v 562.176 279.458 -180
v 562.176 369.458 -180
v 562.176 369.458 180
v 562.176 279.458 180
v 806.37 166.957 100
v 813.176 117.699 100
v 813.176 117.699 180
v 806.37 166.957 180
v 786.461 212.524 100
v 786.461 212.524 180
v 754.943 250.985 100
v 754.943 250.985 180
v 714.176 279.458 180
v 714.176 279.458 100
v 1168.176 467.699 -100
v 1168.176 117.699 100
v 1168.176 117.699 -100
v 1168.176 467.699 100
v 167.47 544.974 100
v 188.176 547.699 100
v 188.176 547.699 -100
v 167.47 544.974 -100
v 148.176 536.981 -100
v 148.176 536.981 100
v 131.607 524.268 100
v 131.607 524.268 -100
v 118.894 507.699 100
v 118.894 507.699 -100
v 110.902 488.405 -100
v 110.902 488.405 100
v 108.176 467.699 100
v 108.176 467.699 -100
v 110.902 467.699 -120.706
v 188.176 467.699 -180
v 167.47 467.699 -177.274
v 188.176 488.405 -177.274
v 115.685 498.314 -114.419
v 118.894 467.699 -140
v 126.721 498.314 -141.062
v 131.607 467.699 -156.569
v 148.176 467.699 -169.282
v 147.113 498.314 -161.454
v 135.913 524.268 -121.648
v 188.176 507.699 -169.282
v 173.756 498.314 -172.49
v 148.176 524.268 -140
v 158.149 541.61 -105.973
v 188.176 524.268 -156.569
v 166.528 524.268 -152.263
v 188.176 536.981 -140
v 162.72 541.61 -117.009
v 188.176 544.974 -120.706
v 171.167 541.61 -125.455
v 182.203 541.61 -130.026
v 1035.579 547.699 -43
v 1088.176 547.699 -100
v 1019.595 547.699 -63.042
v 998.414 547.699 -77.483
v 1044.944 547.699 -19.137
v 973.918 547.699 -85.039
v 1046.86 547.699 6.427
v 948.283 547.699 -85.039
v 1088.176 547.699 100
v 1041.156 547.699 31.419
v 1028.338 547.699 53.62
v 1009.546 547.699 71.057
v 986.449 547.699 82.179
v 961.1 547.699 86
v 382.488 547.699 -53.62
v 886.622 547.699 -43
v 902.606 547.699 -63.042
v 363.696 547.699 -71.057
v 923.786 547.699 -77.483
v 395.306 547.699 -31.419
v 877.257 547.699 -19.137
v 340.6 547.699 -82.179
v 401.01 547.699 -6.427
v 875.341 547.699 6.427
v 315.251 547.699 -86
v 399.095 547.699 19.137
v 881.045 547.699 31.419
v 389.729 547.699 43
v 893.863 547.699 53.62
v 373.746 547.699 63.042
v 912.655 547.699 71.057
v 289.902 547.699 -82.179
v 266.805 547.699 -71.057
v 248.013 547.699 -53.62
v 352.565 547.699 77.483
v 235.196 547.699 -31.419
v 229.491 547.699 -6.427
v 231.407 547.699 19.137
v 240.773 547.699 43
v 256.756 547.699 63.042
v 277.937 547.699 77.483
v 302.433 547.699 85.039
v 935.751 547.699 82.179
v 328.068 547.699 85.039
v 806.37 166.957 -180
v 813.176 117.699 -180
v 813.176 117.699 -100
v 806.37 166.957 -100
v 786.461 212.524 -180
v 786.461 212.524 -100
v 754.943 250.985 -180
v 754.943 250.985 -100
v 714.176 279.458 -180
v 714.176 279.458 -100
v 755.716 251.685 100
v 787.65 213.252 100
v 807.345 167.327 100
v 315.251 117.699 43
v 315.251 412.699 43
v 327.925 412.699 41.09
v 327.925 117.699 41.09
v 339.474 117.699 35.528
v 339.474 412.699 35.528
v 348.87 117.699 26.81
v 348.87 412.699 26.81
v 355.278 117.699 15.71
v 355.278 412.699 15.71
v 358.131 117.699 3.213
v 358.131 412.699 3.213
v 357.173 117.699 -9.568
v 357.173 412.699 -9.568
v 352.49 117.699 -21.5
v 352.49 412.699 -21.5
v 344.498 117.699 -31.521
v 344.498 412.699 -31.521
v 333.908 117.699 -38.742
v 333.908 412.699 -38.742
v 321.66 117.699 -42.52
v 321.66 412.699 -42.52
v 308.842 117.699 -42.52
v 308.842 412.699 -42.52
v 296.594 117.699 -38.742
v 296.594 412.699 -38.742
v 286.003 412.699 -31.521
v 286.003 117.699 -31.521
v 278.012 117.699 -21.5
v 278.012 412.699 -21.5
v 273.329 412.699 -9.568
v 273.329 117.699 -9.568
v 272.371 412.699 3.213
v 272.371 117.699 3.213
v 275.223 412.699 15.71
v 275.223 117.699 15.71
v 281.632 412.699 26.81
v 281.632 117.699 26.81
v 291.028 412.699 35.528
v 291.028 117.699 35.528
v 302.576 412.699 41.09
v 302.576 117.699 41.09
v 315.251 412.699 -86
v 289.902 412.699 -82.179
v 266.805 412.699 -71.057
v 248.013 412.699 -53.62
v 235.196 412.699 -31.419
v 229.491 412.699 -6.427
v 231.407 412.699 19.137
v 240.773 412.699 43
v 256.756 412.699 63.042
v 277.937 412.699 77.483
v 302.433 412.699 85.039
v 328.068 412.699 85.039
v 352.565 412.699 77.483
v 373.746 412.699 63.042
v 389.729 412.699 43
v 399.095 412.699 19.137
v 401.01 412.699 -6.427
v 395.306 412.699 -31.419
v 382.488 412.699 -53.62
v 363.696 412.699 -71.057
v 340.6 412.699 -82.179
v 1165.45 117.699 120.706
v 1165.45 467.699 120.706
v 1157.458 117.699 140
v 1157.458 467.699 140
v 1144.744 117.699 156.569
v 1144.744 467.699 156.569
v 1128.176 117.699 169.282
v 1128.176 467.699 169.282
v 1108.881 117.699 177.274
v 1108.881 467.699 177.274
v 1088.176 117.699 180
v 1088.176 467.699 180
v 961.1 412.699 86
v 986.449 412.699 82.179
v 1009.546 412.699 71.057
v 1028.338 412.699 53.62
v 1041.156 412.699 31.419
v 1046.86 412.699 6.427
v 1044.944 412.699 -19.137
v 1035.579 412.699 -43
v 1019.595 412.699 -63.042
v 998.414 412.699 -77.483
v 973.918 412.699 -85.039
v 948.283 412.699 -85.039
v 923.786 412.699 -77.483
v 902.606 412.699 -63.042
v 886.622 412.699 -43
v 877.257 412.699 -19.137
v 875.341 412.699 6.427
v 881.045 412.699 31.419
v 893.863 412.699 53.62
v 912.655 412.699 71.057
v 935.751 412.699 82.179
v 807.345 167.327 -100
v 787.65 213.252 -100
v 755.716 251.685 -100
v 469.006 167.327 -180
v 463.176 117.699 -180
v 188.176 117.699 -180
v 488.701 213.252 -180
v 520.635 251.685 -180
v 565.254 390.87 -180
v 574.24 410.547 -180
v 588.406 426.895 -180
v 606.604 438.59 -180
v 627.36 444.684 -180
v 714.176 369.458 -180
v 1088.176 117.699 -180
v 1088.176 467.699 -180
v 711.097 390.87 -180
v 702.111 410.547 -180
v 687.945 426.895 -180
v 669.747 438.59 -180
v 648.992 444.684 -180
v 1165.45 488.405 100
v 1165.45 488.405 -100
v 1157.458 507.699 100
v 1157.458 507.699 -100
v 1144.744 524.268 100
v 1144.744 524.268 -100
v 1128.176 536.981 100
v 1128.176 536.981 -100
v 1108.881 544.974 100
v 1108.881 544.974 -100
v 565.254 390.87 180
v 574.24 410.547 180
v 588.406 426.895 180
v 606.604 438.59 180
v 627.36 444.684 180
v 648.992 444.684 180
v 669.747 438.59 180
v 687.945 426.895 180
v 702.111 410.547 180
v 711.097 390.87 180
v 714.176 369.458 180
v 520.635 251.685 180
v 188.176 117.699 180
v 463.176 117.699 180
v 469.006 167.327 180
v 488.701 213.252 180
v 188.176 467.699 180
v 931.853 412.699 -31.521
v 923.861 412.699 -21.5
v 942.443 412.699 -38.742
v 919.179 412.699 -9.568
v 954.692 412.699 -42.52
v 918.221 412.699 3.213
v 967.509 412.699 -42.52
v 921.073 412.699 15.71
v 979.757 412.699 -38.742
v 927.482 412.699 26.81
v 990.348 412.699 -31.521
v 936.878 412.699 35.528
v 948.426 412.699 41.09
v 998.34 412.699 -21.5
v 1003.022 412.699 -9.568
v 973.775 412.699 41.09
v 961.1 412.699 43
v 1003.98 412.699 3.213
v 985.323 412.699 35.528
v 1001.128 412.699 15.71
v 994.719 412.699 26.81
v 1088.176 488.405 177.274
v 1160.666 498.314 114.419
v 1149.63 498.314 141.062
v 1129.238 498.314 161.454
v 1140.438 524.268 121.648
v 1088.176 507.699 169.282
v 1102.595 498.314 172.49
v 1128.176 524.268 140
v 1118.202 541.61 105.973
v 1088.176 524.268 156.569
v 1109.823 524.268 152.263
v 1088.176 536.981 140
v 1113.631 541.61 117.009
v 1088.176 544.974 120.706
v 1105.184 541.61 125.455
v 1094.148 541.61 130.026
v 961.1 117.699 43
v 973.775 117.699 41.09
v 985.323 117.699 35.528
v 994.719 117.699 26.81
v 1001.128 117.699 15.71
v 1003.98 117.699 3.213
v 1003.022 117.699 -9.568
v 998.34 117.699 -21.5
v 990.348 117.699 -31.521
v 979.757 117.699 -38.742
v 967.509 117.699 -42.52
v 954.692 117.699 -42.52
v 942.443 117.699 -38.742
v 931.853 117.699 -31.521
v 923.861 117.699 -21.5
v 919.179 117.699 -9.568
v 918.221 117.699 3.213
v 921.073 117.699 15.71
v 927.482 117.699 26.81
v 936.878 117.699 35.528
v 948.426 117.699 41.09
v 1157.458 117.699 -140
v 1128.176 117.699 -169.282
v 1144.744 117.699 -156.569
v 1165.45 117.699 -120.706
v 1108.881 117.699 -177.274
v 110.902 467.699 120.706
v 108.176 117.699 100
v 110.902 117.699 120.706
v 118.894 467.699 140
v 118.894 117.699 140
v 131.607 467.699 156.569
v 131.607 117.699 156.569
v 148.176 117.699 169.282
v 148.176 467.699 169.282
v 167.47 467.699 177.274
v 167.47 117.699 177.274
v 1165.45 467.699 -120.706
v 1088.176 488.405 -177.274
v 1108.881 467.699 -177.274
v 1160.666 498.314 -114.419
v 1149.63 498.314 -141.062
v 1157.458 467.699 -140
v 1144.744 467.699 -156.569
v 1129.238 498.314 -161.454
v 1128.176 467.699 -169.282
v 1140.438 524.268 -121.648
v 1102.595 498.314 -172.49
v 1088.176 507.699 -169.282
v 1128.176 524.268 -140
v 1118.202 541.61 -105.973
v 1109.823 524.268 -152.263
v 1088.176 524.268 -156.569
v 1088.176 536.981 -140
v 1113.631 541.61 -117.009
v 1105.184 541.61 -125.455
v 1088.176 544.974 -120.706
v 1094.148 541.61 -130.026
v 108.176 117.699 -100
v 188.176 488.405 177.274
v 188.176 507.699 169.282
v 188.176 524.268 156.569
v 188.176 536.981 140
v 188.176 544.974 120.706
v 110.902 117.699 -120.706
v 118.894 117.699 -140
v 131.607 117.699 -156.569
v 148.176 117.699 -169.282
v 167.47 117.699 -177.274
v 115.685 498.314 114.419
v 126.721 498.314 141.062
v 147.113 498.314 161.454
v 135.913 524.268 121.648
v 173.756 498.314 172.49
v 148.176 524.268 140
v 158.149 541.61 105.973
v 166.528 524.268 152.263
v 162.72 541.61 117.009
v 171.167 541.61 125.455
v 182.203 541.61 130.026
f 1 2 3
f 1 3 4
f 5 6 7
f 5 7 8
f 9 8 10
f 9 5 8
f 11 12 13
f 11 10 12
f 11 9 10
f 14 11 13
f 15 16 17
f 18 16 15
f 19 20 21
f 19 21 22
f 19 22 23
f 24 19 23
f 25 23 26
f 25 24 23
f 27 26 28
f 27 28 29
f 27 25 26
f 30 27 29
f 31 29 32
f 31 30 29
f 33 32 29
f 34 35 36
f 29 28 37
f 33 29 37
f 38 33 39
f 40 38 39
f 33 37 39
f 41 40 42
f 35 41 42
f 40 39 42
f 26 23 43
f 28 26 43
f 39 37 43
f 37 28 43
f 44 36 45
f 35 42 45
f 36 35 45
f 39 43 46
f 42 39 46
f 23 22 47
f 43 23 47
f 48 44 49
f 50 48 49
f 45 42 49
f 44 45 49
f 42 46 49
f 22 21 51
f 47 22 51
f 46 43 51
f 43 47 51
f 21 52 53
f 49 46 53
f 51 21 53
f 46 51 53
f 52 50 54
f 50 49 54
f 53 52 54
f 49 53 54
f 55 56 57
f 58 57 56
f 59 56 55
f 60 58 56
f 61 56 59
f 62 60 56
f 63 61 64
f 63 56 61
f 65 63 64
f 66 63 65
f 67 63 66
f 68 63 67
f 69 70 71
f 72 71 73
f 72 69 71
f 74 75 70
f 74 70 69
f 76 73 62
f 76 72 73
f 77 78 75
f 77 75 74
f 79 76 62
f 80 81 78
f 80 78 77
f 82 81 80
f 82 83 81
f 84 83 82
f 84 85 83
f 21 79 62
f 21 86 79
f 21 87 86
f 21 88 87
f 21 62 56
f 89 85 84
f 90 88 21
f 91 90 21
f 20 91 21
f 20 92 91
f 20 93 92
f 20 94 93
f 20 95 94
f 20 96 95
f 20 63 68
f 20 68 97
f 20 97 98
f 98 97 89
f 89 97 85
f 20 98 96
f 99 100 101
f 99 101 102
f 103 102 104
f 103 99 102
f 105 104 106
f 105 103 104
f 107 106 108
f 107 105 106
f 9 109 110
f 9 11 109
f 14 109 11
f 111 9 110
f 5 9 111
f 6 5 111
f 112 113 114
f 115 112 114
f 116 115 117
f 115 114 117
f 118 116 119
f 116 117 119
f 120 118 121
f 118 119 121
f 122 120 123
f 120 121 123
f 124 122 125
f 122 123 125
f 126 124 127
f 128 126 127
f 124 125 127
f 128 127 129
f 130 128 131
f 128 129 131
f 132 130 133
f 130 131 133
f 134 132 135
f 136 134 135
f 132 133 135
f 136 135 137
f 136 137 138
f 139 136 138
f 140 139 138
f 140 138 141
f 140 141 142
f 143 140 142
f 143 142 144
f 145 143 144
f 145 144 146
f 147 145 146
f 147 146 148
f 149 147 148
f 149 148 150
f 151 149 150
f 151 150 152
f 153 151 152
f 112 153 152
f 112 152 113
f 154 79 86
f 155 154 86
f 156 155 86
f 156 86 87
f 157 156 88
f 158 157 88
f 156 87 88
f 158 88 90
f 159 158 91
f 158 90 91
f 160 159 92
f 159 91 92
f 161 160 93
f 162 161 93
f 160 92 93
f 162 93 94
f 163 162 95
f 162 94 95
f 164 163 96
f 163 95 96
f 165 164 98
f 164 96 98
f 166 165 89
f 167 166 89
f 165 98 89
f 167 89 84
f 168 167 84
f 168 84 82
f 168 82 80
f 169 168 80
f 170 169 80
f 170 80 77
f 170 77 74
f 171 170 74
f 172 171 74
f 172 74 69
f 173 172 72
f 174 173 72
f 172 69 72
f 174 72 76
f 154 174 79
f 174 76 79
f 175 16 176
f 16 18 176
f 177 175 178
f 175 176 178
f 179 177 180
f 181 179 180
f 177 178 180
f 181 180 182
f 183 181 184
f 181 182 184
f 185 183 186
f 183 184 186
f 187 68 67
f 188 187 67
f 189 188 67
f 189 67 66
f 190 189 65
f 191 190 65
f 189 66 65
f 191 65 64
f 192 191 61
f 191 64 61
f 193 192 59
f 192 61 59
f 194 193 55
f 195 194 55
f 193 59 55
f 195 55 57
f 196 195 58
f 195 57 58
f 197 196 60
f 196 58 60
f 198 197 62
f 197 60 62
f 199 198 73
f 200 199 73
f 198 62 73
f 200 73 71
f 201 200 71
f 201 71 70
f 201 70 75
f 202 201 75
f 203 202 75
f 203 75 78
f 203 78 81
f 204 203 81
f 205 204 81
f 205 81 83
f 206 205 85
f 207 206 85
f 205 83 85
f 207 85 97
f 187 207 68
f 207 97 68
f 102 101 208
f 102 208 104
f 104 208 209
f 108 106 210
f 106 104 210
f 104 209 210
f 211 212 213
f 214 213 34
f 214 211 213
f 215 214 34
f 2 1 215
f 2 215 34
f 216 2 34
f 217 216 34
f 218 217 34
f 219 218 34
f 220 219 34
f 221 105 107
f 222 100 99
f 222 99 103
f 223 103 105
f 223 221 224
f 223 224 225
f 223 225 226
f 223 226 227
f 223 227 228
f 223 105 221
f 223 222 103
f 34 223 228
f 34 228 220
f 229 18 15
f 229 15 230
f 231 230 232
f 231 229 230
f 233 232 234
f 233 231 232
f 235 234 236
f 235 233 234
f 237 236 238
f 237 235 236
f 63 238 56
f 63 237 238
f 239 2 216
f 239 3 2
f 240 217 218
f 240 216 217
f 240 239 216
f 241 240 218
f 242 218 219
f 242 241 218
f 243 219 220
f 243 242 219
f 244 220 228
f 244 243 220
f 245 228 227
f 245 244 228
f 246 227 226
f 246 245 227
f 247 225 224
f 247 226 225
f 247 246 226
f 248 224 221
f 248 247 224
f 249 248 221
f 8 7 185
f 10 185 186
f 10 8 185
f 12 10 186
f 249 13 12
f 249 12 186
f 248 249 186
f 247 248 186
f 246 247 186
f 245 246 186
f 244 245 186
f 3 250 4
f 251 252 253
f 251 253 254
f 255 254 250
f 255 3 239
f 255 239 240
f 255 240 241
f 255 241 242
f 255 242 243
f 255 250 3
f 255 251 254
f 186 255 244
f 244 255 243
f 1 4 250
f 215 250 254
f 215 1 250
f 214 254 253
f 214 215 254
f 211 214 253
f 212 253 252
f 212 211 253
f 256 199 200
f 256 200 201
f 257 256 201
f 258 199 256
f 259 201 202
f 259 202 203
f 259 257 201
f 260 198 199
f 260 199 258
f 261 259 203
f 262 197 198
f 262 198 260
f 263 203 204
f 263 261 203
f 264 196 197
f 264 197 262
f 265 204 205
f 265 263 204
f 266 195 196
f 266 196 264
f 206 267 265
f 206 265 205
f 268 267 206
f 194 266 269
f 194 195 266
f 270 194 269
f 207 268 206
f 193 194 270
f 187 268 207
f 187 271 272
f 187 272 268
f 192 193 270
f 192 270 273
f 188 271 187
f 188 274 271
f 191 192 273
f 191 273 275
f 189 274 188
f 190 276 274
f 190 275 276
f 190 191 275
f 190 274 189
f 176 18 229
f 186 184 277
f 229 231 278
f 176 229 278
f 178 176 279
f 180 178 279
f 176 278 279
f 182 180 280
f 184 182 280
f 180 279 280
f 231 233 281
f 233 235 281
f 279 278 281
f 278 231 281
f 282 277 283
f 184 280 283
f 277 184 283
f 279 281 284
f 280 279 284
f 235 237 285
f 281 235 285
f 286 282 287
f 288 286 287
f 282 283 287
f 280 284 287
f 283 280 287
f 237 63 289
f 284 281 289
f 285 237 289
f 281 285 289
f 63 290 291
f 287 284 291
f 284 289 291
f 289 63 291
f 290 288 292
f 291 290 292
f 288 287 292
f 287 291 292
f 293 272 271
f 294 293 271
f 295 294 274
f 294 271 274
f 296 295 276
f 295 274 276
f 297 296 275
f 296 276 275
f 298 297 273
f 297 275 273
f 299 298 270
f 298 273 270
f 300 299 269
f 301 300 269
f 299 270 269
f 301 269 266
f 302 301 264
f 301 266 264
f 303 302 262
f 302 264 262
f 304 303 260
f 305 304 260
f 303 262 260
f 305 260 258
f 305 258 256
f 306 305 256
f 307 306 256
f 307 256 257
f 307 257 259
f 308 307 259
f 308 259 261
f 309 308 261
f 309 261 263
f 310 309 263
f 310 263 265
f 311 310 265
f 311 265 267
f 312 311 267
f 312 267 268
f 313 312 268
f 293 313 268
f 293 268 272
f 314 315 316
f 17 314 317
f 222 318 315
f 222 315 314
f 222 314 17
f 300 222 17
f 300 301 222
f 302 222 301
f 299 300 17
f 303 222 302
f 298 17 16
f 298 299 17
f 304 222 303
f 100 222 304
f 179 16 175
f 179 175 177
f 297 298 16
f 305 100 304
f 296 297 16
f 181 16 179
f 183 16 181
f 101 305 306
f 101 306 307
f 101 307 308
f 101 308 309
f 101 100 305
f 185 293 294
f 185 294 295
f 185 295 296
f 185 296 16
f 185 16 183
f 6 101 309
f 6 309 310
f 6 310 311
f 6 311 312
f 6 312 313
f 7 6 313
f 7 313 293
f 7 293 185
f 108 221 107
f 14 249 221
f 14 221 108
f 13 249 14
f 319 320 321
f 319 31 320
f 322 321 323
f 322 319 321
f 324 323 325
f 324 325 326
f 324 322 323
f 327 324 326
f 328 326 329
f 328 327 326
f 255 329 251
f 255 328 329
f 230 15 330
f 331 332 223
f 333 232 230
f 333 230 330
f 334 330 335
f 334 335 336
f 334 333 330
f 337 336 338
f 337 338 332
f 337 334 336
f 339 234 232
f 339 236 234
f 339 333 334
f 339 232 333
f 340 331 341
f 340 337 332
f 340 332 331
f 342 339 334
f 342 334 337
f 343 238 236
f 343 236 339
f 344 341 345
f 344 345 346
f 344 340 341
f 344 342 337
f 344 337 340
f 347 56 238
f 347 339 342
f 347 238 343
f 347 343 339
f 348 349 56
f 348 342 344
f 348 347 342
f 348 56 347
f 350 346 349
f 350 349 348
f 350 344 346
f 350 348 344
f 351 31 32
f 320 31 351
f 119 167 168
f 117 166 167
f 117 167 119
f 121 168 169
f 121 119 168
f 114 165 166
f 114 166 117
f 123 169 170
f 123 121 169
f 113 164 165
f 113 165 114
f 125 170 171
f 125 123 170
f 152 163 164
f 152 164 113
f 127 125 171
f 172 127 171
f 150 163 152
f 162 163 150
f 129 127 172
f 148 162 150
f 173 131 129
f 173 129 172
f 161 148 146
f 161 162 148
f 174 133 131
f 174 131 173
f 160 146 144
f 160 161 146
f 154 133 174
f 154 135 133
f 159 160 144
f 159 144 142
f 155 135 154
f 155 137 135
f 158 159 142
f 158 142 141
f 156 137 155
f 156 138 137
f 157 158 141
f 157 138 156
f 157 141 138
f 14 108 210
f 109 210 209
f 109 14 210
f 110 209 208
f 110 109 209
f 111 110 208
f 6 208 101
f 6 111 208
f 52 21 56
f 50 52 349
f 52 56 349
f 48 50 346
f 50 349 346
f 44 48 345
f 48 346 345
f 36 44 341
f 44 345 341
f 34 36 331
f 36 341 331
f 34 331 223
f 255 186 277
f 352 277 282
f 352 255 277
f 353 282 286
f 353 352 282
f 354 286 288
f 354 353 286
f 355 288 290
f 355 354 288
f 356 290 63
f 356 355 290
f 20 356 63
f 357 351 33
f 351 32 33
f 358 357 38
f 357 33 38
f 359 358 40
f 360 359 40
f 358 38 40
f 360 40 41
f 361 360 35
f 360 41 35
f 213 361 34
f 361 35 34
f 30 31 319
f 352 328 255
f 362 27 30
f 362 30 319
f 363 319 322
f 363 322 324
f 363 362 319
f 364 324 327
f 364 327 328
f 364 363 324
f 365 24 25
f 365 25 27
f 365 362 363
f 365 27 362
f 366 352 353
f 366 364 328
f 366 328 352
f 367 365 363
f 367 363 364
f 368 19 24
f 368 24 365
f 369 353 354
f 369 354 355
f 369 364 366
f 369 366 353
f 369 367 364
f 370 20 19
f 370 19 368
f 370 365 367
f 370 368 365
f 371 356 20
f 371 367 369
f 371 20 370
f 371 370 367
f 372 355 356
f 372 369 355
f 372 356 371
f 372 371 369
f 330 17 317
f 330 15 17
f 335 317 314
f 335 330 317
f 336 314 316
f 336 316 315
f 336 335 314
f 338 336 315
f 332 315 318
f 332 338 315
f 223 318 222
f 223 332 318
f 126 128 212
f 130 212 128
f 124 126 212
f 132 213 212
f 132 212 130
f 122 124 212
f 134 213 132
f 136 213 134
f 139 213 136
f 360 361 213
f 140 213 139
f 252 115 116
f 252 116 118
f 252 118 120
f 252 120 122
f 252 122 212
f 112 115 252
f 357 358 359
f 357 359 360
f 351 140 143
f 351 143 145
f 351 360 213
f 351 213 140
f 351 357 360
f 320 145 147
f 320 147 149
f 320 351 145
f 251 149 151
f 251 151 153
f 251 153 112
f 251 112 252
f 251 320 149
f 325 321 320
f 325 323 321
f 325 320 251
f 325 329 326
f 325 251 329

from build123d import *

# Parameters (mm, degrees)
BOSS_EXTRUDE2_DEPTH = 100
REVOLVE1_ANGLE      = 90
REVOLVE2_ANGLE      = 90
BOSS_EXTRUDE3_REACH = 1139.003
SKETCH10_W          = 80
SKETCH10_H          = 350
REVOLVE3_ANGLE      = 90
REVOLVE4_ANGLE      = 90
BOSS_EXTRUDE4_REACH = 1139.003
SKETCH14_R          = 86
SKETCH14_R_2        = 43
CUT_EXTRUDE2_DEPTH  = 135
SKETCH17_R          = 43
CUT_EXTRUDE3_DEPTH  = 583
CUT_EXTRUDE4_DEPTH  = 1340.48085047


with BuildPart() as part:
    # Sketch4 → Boss-Extrude2 (new, symmetric)
    with BuildSketch(Plane.XY):
        with BuildLine():
            Line((813.175605254, 117.699465094), (1168.175605254, 117.699465094))
            Line((1168.175605254, 117.699465094), (1168.175605254, 467.699465094))
            ThreePointArc((1168.175605254, 467.699465094), (1144.744147749, 524.268007589), (1088.175605254, 547.699465094))
            Line((1088.175605254, 547.699465094), (638.175605254, 547.699465094))
            Line((638.175605254, 547.699465094), (638.175605254, 445.457996532))
            ThreePointArc((638.175605254, 445.457996532), (691.915720625, 423.198111902), (714.175605254, 369.457996532))
            Line((714.175605254, 369.457996532), (714.175605254, 279.457996532))
            ThreePointArc((714.175605254, 279.457996532), (787.650444518, 213.251892507), (813.175605254, 117.699465094))
        make_face()
        with BuildLine():
            Line((638.175605254, 445.457996532), (638.175605254, 547.699465094))
            Line((638.175605254, 547.699465094), (188.175605254, 547.699465094))
            ThreePointArc((188.175605254, 547.699465094), (131.607062759, 524.268007589), (108.175605254, 467.699465094))
            Line((108.175605254, 467.699465094), (108.175605254, 117.699465094))
            Line((108.175605254, 117.699465094), (463.175605254, 117.699465094))
            ThreePointArc((463.175605254, 117.699465094), (488.70076599, 213.251892507), (562.175605254, 279.457996532))
            Line((562.175605254, 279.457996532), (562.175605254, 369.457996532))
            ThreePointArc((562.175605254, 369.457996532), (584.435489884, 423.198111902), (638.175605254, 445.457996532))
        make_face()
    extrude(amount=BOSS_EXTRUDE2_DEPTH, both=True)

    # Sketch7 → Revolve1 (revolve)
    with BuildSketch(Plane(origin=(0, 0, -100), x_dir=(-1, 0, 0), z_dir=(0, 0, -1))):
        with BuildLine():
            Line((-1088.175605254, 547.699465094), (-1088.175605254, 117.699465094))
            Line((-1088.175605254, 117.699465094), (-1168.175605254, 117.699465094))
            Line((-1168.175605254, 117.699465094), (-1168.175605254, 467.699465094))
            ThreePointArc((-1168.175605254, 467.699465094), (-1144.744147749, 524.268007589), (-1088.175605254, 547.699465094))
        make_face()
    revolve(axis=Axis((1088.175605254, 547.699465094, -100), (0, 1, 0)), revolution_arc=REVOLVE1_ANGLE)

    # Sketch8 → Revolve2 (revolve)
    with BuildSketch(Plane(origin=(0, 0, -100), x_dir=(-1, 0, 0), z_dir=(0, 0, -1))):
        with BuildLine():
            Line((-188.175605254, 547.699465094), (-188.175605254, 117.699465094))
            Line((-188.175605254, 117.699465094), (-108.175605254, 117.699465094))
            Line((-108.175605254, 117.699465094), (-108.175605254, 467.699465094))
            ThreePointArc((-108.175605254, 467.699465094), (-131.607062759, 524.268007589), (-188.175605254, 547.699465094))
        make_face()
    revolve(axis=Axis((188.175605254, 547.699465094, -100), (0, -1, 0)), revolution_arc=REVOLVE2_ANGLE)

    # Boss-Extrude3: up to this face of the body (flat: up to its plane)
    boss_extrude3_end = Plane(part.part.faces().sort_by_distance((188.175605254, 324.501535412, -139.079671816))[0])
    # Sketch10 → Boss-Extrude3 (add, up to the picked face)
    with BuildSketch(Plane.ZY.offset(-1088.175605254), mode=Mode.PRIVATE) as boss_extrude3_sk1:
        with BuildLine():
            Line((-100, 467.699465094), (-100, 547.699465094))
            ThreePointArc((-100, 547.699465094), (-156.568542495, 524.268007589), (-180, 467.699465094))
            Line((-180, 467.699465094), (-100, 467.699465094))
        make_face()
    boss_extrude3_tool1 = split(extrude(boss_extrude3_sk1.sketch, amount=BOSS_EXTRUDE3_REACH, mode=Mode.PRIVATE), bisect_by=boss_extrude3_end, keep=Keep.BOTH, mode=Mode.PRIVATE)
    # Sketch10 → Boss-Extrude3 (add, up to the picked face)
    with BuildSketch(Plane.ZY.offset(-1088.175605254), mode=Mode.PRIVATE) as boss_extrude3_sk2:
        with Locations((-140, 292.699465094)):
            Rectangle(SKETCH10_W, SKETCH10_H)
    boss_extrude3_tool2 = split(extrude(boss_extrude3_sk2.sketch, amount=BOSS_EXTRUDE3_REACH, mode=Mode.PRIVATE), bisect_by=boss_extrude3_end, keep=Keep.BOTH, mode=Mode.PRIVATE)
    add(boss_extrude3_tool1.solids().sort_by(Axis((1088.175605, 501.65252, -133.953055), (-1, 0, 0)))[0])
    add(boss_extrude3_tool2.solids().sort_by(Axis((1088.175605, 292.699465, -140), (-1, 0, 0)))[0])

    # Sketch11 → Revolve3 (revolve)
    with BuildSketch(Plane.XY.offset(100)):
        with BuildLine():
            Line((1088.175605254, 547.699465094), (1088.175605254, 117.699465094))
            Line((1088.175605254, 117.699465094), (1168.175605254, 117.699465094))
            Line((1168.175605254, 117.699465094), (1168.175605254, 467.699465094))
            ThreePointArc((1168.175605254, 467.699465094), (1144.744147749, 524.268007589), (1088.175605254, 547.699465094))
        make_face()
    revolve(axis=Axis((1088.175605254, 547.699465094, 100), (0, -1, 0)), revolution_arc=REVOLVE3_ANGLE)

    # Sketch12 → Revolve4 (revolve)
    with BuildSketch(Plane.XY.offset(100)):
        with BuildLine():
            Line((188.175605254, 547.699465094), (188.175605254, 117.699465094))
            Line((188.175605254, 117.699465094), (108.175605254, 117.699465094))
            Line((108.175605254, 117.699465094), (108.175605254, 467.699465094))
            ThreePointArc((108.175605254, 467.699465094), (131.607062759, 524.268007589), (188.175605254, 547.699465094))
        make_face()
    revolve(axis=Axis((188.175605254, 547.699465094, 100), (0, 1, 0)), revolution_arc=REVOLVE4_ANGLE)

    # Boss-Extrude4: up to this face of the body (flat: up to its plane)
    boss_extrude4_end = Plane(part.part.faces().sort_by_distance((1088.175605254, 324.501535412, 139.079671816))[0])
    # Sketch13 → Boss-Extrude4 (add, up to the picked face)
    with BuildSketch(Plane(origin=(188.175605254, 0, 0), x_dir=(0, 0, -1), z_dir=(1, 0, 0)), mode=Mode.PRIVATE) as boss_extrude4_sk1:
        with BuildLine():
            Line((-100, 547.699465094), (-100, 117.699465094))
            Line((-100, 117.699465094), (-180, 117.699465094))
            Line((-180, 117.699465094), (-180, 467.699465094))
            ThreePointArc((-180, 467.699465094), (-156.568542495, 524.268007589), (-100, 547.699465094))
        make_face()
    boss_extrude4_tool1 = split(extrude(boss_extrude4_sk1.sketch, amount=BOSS_EXTRUDE4_REACH, mode=Mode.PRIVATE), bisect_by=boss_extrude4_end, keep=Keep.BOTH, mode=Mode.PRIVATE)
    add(boss_extrude4_tool1.solids().sort_by(Axis((188.175605, 324.501535, 139.079672), (1, 0, 0)))[0])

    # Sketch14 → Cut-Extrude2 (cut)
    # profile 1 of 2: a face of its own
    with BuildSketch(Plane(origin=(0, 547.699465094, 0), x_dir=(1, 0, 0), z_dir=(0, 1, 0))):
        with Locations(Location((961.100411774, 0, 0), (0, 0, 270))):
            Circle(SKETCH14_R)
        with Locations(Location((961.100411774, 0, 0), (0, 0, 270))):
            Circle(SKETCH14_R_2, mode=Mode.SUBTRACT)
    # profile 2 of 2: a face of its own
    with BuildSketch(Plane(origin=(0, 547.699465094, 0), x_dir=(1, 0, 0), z_dir=(0, 1, 0))):
        with Locations(Location((315.250798734, 0, 0), (0, 0, 90))):
            Circle(SKETCH14_R)
        with Locations(Location((315.250798734, 0, 0), (0, 0, 90))):
            Circle(SKETCH14_R_2, mode=Mode.SUBTRACT)
    extrude(amount=-CUT_EXTRUDE2_DEPTH, mode=Mode.SUBTRACT)

    # Sketch17 → Cut-Extrude3 (cut)
    with BuildSketch(Plane(origin=(0, 547.699465094, 0), x_dir=(1, 0, 0), z_dir=(0, 1, 0))):
        with Locations(Location((961.100411774, 0, 0), (0, 0, 270))):
            Circle(SKETCH17_R)
        with Locations(Location((315.250798734, 0, 0), (0, 0, 270))):
            Circle(SKETCH17_R)
    extrude(amount=-CUT_EXTRUDE3_DEPTH, mode=Mode.SUBTRACT)

    # Sketch18 → Cut-Extrude4 (cut, through all)
    with BuildSketch(Plane(origin=(0, 0, -180), x_dir=(-1, 0, 0), z_dir=(0, 0, -1))):
        with BuildLine():
            Line((-714.175605254, 279.457996532), (-714.175605254, 369.457996532))
            ThreePointArc((-714.175605254, 369.457996532), (-638.175605254, 445.457996532), (-562.175605254, 369.457996532))
            Line((-562.175605254, 369.457996532), (-562.175605254, 279.457996532))
            ThreePointArc((-562.175605254, 279.457996532), (-488.70076599, 213.251892507), (-463.175605254, 117.699465094))
            Line((-463.175605254, 117.699465094), (-813.175605254, 117.699465094))
            ThreePointArc((-813.175605254, 117.699465094), (-786.461236826, 212.524069618), (-714.175605254, 279.457996532))
        make_face()
    extrude(amount=-CUT_EXTRUDE4_DEPTH, mode=Mode.SUBTRACT)


solid = part.part
